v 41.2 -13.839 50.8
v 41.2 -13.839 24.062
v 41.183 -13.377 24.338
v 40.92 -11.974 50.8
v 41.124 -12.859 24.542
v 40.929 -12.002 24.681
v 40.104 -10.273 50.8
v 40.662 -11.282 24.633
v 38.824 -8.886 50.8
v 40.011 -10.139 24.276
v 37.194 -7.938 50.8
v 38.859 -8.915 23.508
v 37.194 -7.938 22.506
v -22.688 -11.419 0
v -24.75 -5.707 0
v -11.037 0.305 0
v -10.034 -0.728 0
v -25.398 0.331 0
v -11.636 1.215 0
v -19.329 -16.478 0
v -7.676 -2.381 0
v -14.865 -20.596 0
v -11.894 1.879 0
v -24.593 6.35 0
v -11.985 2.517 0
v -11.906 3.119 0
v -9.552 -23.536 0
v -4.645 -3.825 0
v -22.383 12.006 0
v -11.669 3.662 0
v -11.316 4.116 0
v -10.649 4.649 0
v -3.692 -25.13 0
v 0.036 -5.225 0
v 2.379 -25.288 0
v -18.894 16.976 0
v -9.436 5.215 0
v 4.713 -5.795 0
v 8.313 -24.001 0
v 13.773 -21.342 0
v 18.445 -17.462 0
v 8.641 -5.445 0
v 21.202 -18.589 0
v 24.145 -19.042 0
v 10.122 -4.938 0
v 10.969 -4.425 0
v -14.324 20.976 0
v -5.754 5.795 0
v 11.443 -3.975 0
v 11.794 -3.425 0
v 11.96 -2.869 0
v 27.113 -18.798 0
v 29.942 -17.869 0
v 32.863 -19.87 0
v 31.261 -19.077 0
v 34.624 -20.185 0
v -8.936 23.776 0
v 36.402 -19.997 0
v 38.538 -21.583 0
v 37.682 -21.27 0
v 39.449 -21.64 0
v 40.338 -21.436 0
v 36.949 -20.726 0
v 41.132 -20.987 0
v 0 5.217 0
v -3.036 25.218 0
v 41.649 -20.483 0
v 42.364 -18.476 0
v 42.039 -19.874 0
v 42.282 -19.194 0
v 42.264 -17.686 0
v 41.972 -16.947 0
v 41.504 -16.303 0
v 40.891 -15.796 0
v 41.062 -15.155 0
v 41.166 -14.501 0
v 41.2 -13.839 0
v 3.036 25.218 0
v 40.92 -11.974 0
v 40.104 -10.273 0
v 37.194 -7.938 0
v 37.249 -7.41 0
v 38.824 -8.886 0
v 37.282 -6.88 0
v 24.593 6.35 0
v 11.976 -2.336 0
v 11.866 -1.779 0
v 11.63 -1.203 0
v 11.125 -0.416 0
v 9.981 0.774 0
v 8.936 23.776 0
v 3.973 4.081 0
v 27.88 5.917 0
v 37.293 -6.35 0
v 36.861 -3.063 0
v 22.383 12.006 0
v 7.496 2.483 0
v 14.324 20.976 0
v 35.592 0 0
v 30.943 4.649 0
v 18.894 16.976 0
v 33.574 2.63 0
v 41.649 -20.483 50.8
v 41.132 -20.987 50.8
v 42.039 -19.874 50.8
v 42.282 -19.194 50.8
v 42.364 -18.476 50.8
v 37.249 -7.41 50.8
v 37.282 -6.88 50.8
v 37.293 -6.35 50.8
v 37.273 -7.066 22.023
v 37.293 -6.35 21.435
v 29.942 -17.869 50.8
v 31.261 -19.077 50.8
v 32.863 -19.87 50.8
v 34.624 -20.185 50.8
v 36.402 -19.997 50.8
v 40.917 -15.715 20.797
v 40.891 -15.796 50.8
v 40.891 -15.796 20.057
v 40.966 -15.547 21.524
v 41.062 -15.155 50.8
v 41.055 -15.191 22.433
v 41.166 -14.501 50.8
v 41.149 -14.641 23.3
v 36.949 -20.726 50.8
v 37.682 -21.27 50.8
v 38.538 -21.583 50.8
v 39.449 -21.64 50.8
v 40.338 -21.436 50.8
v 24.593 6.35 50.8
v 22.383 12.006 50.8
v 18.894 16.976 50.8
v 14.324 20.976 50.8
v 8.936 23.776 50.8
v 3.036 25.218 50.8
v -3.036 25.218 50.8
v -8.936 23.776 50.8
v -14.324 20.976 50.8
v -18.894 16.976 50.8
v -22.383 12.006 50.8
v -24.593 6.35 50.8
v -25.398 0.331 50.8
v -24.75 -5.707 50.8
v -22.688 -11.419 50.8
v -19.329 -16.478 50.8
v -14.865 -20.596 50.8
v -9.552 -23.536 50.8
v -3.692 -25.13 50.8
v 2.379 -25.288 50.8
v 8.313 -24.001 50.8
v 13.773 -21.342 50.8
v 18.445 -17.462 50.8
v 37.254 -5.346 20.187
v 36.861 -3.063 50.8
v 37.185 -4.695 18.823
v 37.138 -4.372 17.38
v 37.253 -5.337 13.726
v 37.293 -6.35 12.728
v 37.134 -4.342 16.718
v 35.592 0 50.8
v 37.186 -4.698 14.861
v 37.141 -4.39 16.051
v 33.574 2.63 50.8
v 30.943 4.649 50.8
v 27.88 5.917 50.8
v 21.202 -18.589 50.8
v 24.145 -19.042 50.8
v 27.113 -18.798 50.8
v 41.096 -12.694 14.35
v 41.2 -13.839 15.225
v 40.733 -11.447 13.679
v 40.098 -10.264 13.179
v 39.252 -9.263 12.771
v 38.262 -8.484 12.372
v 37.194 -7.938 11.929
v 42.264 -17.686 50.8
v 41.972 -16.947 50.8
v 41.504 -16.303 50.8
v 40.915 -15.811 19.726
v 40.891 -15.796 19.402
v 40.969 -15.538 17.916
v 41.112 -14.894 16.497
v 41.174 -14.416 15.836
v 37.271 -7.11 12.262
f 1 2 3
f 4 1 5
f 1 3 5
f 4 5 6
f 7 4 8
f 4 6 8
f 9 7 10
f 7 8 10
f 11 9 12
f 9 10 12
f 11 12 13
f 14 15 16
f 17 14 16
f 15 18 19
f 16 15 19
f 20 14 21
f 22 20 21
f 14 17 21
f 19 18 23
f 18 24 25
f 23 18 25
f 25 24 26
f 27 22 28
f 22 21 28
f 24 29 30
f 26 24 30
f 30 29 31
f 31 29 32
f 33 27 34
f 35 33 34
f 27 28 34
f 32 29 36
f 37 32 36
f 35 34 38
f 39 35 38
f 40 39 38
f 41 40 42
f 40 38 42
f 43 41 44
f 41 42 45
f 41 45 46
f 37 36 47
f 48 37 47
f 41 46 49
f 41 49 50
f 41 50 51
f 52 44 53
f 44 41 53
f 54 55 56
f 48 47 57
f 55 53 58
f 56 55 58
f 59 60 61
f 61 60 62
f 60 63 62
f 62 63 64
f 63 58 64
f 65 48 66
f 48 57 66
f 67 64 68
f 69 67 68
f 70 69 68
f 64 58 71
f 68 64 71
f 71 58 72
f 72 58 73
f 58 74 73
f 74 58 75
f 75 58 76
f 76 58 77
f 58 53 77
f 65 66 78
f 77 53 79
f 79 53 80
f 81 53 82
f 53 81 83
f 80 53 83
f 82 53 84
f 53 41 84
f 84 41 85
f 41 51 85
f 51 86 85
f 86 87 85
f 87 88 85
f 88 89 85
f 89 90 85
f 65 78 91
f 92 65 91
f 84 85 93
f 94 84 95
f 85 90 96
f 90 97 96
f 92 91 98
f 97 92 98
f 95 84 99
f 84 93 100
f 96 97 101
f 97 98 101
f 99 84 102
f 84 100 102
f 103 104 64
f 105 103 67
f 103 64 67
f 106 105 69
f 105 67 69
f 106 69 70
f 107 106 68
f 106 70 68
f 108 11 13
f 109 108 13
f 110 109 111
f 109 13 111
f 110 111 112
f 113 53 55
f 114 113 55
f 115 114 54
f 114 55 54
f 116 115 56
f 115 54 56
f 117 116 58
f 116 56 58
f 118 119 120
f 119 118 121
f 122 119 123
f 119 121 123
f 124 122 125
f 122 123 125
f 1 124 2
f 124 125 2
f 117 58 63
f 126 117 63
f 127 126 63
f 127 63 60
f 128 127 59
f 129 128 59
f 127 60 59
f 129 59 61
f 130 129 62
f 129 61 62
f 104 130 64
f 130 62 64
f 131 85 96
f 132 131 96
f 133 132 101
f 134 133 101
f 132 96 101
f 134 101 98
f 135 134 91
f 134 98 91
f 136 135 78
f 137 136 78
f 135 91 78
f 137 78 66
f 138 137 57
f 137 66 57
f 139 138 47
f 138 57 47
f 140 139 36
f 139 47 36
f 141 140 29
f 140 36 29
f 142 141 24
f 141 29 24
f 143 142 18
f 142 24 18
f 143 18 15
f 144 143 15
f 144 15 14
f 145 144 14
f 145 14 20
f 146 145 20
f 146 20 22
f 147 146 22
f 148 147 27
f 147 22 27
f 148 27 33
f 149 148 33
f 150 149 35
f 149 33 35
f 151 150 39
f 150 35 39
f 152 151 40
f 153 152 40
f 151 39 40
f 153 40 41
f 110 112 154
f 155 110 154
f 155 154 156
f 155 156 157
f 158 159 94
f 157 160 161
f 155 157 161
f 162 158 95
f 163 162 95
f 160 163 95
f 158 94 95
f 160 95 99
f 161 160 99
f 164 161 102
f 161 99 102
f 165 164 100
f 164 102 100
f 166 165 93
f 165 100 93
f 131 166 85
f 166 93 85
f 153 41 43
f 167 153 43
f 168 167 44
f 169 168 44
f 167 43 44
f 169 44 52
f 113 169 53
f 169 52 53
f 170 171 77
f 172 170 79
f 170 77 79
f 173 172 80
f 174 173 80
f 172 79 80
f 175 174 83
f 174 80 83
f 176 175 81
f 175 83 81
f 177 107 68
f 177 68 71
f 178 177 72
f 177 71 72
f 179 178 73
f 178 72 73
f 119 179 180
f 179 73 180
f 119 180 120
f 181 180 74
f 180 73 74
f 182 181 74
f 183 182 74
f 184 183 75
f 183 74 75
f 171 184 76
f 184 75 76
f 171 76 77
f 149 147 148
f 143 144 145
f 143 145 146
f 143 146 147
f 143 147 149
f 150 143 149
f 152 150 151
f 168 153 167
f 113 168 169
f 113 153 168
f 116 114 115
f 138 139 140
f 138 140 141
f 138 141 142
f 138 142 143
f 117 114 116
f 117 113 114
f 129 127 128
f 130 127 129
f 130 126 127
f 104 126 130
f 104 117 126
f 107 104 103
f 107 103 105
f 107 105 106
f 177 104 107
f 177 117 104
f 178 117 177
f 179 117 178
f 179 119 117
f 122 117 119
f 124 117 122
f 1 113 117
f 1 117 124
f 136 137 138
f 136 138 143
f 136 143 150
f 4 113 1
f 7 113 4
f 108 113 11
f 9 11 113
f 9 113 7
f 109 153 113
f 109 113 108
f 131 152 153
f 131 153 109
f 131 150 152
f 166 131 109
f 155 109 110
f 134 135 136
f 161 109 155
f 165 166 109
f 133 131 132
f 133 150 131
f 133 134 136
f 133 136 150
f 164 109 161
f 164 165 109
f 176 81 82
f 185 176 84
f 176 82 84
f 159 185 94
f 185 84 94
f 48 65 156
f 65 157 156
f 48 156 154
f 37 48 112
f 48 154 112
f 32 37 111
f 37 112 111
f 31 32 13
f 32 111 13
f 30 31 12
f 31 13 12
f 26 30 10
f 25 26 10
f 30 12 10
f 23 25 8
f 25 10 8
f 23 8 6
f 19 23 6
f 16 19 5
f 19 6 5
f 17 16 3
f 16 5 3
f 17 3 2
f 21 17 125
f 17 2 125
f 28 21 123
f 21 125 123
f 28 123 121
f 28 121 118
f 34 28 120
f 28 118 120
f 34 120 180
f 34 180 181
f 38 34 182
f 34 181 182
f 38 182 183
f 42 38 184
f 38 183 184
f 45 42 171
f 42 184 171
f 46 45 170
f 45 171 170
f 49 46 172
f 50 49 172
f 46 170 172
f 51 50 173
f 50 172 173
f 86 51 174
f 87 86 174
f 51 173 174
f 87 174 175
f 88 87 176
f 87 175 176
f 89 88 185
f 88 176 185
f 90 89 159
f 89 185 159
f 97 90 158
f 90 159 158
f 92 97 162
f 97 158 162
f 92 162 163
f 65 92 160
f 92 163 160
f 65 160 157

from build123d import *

# Parameters (mm, degrees)
F1_DEPTH = 50.8
F4_R     = 5.08
F5_DEPTH = 63.5


with BuildPart() as f1:
    # F0 (on Top) → F1 (new body)
    with BuildSketch(Plane.XY):
        with BuildLine():
            ThreePointArc((12.7995573241, -1.6389246221), (17.4709677584, 4.1647671705), (24.5934442484, 6.35))
            ThreePointArc((24.5934442484, 6.35), (-6.35, 24.5934442484), (-24.5934442484, -6.35))
            ThreePointArc((-24.5934442484, -6.35), (-6.35, -0.3984375242), (12.7995573241, -1.6389246221))
        make_face()
        with BuildLine():
            ThreePointArc((12.7995573241, -1.6389246221), (-6.35, -0.3984375242), (-24.5934442484, -6.35))
            ThreePointArc((-24.5934442484, -6.35), (-6.35, -24.5934442484), (18.4450831863, -17.4625))
            ThreePointArc((18.4450831863, -17.4625), (12.6319455908, -10.6176164148), (12.7995573241, -1.6389246221))
        make_face()
        with BuildLine():
            ThreePointArc((18.4450831863, -17.4625), (22.225, -12.2967221242), (24.5934442484, -6.35))
            ThreePointArc((24.5934442484, -6.35), (18.8443015114, -3.6244523026), (12.7995573241, -1.6389246221))
            ThreePointArc((12.7995573241, -1.6389246221), (12.6319455908, -10.6176164148), (18.4450831863, -17.4625))
        make_face()
        with BuildLine():
            ThreePointArc((24.5934442484, -6.35), (25.1975542852, -3.2005090291), (25.4, 0))
            ThreePointArc((25.4, 0), (25.1975542852, 3.2005090291), (24.5934442484, 6.35))
            ThreePointArc((24.5934442484, 6.35), (17.4709677584, 4.1647671705), (12.7995573241, -1.6389246221))
            ThreePointArc((12.7995573241, -1.6389246221), (18.8443015114, -3.6244523026), (24.5934442484, -6.35))
        make_face()
        with BuildLine():
            ThreePointArc((24.5934442484, 6.35), (25.1975542852, 3.2005090291), (25.4, 0))
            ThreePointArc((25.4, 0), (25.1975542852, -3.2005090291), (24.5934442484, -6.35))
            ThreePointArc((24.5934442484, -6.35), (27.3340357189, -7.9807229005), (29.9669059095, -9.7801931963))
            ThreePointArc((29.9669059095, -9.7801931963), (33.2813397987, -7.6860670857), (37.1938348674, -7.9375))
            ThreePointArc((37.1938348674, -7.9375), (37.2685174407, -7.1453109893), (37.2934442484, -6.35))
            ThreePointArc((37.2934442484, -6.35), (33.5737003695, 2.6302561211), (24.5934442484, 6.35))
        make_face()
        with BuildLine():
            ThreePointArc((29.9669059095, -9.7801931963), (27.3340357189, -7.9807229005), (24.5934442484, -6.35))
            ThreePointArc((24.5934442484, -6.35), (22.225, -12.2967221242), (18.4450831863, -17.4625))
            ThreePointArc((18.4450831863, -17.4625), (24.1451446263, -19.0420852286), (29.9424477824, -17.8686006613))
            ThreePointArc((29.9424477824, -17.8686006613), (28.5002699382, -13.8199990211), (29.9669059095, -9.7801931963))
        make_face()
        with BuildLine():
            ThreePointArc((34.8502409072, -13.8392003779), (32.4720574524, -11.7333200181), (29.9669059095, -9.7801931963))
            ThreePointArc((29.9669059095, -9.7801931963), (28.5002699382, -13.8199990211), (29.9424477824, -17.8686006613))
            ThreePointArc((29.9424477824, -17.8686006613), (32.6522448152, -16.1655862497), (34.8502409072, -13.8392003779))
        make_face()
        with BuildLine():
            ThreePointArc((37.1938348674, -7.9375), (33.2813397987, -7.6860670857), (29.9669059095, -9.7801931963))
            ThreePointArc((29.9669059095, -9.7801931963), (32.4720574524, -11.7333200181), (34.8502409072, -13.8392003779))
            ThreePointArc((34.8502409072, -13.8392003779), (36.3968450041, -11.0371879203), (37.1938348674, -7.9375))
        make_face()
        with BuildLine():
            ThreePointArc((41.2002409072, -13.8392003779), (40.1040167707, -10.272641928), (37.1938348674, -7.9375))
            ThreePointArc((37.1938348674, -7.9375), (36.3968450041, -11.0371879203), (34.8502409072, -13.8392003779))
            ThreePointArc((34.8502409072, -13.8392003779), (35.9893415804, -14.9474227898), (37.0932189983, -16.0907346038))
            ThreePointArc((37.0932189983, -16.0907346038), (38.9431027022, -15.3102596751), (40.8913363289, -15.7956425842))
            ThreePointArc((40.8913363289, -15.7956425842), (41.1225393666, -14.829539732), (41.2002409072, -13.8392003779))
        make_face()
        with BuildLine():
            ThreePointArc((34.8502409072, -13.8392003779), (32.6522448152, -16.1655862497), (29.9424477824, -17.8686006613))
            ThreePointArc((29.9424477824, -17.8686006613), (32.8633256958, -19.8703418903), (36.4020454568, -19.9966676039))
            ThreePointArc((36.4020454568, -19.9966676039), (36.0626125115, -17.922483586), (37.0932189983, -16.0907346038))
            ThreePointArc((37.0932189983, -16.0907346038), (35.9893415804, -14.9474227898), (34.8502409072, -13.8392003779))
        make_face()
        with BuildLine():
            ThreePointArc((37.0932189983, -16.0907346038), (36.0626125115, -17.922483586), (36.4020454568, -19.9966676039))
            ThreePointArc((36.4020454568, -19.9966676039), (37.892136008, -19.4131912458), (39.1890408908, -18.4757200535))
            ThreePointArc((39.1890408908, -18.4757200535), (38.1597671946, -17.2668497207), (37.0932189983, -16.0907346038))
        make_face()
        with BuildLine():
            ThreePointArc((40.8913363289, -15.7956425842), (38.9431027022, -15.3102596751), (37.0932189983, -16.0907346038))
            ThreePointArc((37.0932189983, -16.0907346038), (38.1597671946, -17.2668497207), (39.1890408908, -18.4757200535))
            ThreePointArc((39.1890408908, -18.4757200535), (40.2103958459, -17.243791254), (40.8913363289, -15.7956425842))
        make_face()
        with BuildLine():
            ThreePointArc((42.3640408908, -18.4757200535), (41.971612814, -16.9466947129), (40.8913363289, -15.7956425842))
            ThreePointArc((40.8913363289, -15.7956425842), (40.2103958459, -17.243791254), (39.1890408908, -18.4757200535))
            ThreePointArc((39.1890408908, -18.4757200535), (40.1800346913, -19.7161647764), (41.1317805923, -20.9869722217))
            ThreePointArc((41.1317805923, -20.9869722217), (42.0393762704, -19.8743669796), (42.3640408908, -18.4757200535))
        make_face()
        with BuildLine():
            ThreePointArc((39.1890408908, -18.4757200535), (37.892136008, -19.4131912458), (36.4020454568, -19.9966676039))
            ThreePointArc((36.4020454568, -19.9966676039), (38.5383737374, -21.583332844), (41.1317805923, -20.9869722217))
            ThreePointArc((41.1317805923, -20.9869722217), (40.1800346913, -19.7161647764), (39.1890408908, -18.4757200535))
        make_face()
    extrude(amount=F1_DEPTH)

    # F4 (on 3pt) → F5 (cut, symmetric)
    with BuildSketch(Plane(origin=(36.3446660233, -9.3841524154, 17.0086899215), x_dir=(0.2062459752, 0.9737281746, 0.0965196334), z_dir=(0.8819306257, -0.2277135084, 0.4127286391))):
        Circle(F4_R)
    extrude(amount=F5_DEPTH, both=True, mode=Mode.SUBTRACT)


solid = f1.part
